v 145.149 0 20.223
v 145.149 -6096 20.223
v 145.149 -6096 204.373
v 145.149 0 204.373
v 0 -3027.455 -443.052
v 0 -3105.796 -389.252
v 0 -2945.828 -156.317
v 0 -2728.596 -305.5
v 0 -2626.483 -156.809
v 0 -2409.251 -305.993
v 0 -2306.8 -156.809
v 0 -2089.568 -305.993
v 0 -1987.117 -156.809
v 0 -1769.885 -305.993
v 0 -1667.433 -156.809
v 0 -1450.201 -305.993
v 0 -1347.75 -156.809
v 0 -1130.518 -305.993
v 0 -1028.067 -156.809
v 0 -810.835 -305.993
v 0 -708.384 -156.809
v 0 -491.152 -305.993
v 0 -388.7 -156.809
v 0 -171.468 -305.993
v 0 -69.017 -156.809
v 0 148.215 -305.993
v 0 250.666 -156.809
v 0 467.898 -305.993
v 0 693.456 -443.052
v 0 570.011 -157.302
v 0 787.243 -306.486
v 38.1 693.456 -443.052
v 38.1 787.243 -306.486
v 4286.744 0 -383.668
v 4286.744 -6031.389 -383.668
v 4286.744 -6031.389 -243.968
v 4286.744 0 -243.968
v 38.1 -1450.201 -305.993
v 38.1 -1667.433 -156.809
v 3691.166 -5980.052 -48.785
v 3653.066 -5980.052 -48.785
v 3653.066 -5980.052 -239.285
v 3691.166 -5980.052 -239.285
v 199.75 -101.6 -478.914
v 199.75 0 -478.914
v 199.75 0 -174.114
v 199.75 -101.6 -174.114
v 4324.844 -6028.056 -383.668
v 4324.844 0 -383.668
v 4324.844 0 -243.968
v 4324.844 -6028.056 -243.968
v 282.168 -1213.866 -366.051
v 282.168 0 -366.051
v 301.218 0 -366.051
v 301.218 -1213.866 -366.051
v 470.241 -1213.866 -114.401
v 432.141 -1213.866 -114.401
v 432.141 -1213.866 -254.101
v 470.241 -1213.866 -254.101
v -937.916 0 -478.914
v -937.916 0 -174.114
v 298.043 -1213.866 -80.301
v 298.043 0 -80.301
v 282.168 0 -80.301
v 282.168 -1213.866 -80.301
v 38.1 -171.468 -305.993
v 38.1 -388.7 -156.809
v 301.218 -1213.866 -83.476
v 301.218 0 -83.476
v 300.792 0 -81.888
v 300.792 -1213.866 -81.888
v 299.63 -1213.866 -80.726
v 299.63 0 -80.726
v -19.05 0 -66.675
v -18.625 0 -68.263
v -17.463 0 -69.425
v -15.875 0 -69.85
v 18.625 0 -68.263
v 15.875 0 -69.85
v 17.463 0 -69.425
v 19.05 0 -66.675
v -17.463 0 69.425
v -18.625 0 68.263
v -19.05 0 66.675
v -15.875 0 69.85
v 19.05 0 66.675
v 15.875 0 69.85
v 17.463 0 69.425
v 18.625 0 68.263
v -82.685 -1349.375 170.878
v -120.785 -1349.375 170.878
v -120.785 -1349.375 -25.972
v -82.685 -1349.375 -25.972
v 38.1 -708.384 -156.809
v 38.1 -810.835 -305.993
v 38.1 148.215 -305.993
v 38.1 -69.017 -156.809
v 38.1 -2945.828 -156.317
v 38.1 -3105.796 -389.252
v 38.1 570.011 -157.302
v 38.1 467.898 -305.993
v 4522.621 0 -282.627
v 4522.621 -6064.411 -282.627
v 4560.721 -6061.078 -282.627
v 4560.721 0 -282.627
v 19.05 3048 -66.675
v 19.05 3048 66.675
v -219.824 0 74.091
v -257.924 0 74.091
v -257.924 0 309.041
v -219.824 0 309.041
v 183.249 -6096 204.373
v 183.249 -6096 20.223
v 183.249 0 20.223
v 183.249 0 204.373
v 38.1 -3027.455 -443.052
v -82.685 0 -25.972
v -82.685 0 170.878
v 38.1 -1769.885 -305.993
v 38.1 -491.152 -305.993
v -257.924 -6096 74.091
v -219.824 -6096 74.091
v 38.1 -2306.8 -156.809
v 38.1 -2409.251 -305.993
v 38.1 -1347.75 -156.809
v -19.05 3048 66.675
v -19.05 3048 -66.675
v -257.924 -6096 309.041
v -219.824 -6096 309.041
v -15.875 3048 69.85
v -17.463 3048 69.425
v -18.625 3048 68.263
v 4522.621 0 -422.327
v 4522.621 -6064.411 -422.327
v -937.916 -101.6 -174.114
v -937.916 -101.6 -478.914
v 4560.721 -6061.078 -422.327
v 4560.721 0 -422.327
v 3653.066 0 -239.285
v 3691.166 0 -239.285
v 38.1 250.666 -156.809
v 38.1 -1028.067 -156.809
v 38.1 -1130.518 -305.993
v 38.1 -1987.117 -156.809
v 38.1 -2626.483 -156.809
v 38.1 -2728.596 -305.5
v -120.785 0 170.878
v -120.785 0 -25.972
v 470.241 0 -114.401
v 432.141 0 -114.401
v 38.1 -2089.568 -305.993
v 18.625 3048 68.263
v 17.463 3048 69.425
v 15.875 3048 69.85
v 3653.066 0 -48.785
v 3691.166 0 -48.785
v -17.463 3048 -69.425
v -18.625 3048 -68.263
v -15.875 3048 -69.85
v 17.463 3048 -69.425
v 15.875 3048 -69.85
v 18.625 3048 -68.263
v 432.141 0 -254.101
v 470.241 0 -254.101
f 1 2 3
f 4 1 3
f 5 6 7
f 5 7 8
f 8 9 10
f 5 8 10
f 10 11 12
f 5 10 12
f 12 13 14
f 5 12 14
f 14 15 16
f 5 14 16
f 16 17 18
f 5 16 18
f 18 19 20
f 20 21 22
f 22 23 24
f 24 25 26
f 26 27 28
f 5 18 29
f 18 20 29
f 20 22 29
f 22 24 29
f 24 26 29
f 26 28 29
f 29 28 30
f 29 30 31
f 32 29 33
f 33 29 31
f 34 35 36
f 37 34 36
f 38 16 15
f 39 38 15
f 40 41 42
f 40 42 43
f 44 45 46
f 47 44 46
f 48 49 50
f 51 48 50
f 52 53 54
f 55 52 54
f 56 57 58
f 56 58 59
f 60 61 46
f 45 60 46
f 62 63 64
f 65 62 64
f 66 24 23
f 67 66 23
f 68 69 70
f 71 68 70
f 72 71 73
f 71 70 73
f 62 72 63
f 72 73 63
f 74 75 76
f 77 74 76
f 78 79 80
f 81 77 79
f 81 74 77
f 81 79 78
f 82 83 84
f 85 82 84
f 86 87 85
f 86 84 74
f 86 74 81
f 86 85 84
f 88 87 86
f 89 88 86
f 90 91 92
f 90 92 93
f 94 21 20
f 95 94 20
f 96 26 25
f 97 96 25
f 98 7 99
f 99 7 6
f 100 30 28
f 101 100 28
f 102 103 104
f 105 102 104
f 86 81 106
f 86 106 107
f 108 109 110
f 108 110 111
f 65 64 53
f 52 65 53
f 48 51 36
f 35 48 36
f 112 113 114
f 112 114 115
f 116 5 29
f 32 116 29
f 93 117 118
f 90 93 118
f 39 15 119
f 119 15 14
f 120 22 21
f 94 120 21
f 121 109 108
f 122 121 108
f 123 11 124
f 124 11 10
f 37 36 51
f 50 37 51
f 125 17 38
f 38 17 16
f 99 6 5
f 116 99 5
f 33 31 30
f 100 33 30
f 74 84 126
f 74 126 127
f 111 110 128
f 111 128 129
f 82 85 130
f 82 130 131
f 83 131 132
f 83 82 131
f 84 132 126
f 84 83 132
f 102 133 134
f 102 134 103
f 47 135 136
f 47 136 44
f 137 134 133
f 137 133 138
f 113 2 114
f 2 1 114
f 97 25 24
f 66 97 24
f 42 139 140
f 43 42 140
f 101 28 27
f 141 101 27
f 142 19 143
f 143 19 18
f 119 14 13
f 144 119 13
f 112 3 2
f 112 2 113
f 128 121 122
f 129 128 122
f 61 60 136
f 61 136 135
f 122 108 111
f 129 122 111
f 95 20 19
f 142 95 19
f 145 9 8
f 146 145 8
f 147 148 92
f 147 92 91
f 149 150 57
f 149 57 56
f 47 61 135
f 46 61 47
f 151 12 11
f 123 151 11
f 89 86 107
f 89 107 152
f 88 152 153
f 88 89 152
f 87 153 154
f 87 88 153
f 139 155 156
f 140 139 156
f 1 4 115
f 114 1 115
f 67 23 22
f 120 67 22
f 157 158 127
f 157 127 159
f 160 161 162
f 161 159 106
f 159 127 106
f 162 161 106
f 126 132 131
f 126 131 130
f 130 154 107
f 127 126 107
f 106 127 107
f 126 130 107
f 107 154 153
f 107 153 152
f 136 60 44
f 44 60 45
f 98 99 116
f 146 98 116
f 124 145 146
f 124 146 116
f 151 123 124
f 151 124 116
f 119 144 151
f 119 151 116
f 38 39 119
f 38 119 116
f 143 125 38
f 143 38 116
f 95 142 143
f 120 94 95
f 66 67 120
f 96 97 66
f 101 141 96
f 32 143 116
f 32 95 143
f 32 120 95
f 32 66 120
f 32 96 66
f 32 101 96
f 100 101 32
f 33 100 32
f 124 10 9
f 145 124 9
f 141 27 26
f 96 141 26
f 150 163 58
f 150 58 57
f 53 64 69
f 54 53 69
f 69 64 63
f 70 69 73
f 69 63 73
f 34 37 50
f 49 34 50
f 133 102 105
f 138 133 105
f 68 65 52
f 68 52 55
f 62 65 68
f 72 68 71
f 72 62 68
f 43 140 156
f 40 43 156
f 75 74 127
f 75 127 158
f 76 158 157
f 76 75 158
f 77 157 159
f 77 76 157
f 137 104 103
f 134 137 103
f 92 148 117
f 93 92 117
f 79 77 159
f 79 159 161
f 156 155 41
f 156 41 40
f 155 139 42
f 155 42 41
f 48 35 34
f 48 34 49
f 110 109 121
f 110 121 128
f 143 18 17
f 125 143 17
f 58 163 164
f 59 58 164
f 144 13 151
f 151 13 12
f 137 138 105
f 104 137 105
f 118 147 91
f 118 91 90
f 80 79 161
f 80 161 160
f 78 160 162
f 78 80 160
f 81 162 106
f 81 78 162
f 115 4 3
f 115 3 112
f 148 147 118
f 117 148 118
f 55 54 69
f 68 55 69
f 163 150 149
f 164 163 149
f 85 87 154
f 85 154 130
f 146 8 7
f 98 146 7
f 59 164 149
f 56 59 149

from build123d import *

# Parameters (mm, degrees)
F1_DEPTH  = 3048
F2_W      = 38.1
F2_H      = 184.15
F3_DEPTH  = 50.8
F4_DEPTH  = 6045.2
F5_W      = 38.1
F5_H      = 234.95
F6_DEPTH  = 6096
F7_W      = 139.7
F7_H      = 19.05
F8_DEPTH  = 1137.666
F9_W      = 139.7
F9_H      = 19.05
F11_DEPTH = 1219.2
F17_W     = 38.1
F17_H     = 196.85
F18_DEPTH = 1349.375
F20_DEPTH = 38.1
F21_W     = 38.1
F21_H     = 139.7
F22_DEPTH = 1213.866
F24_DEPTH = 1213.866
F26_W     = 3048
F26_H     = 4572
F27_DEPTH = 152.4
F29_W     = 38.1
F29_H     = 190.5
F30_DEPTH = 5980.05154
F31_W     = 38.1
F31_H     = 139.7
F32_DEPTH = 6066.1558636
F34_DEPTH = 152.4
F35_W     = 38.1
F35_H     = 139.7
F36_DEPTH = 6111.8779464
F38_DEPTH = 152.4
F39_W     = 1137.666
F39_H     = 304.8
F40_DEPTH = 101.6


with BuildPart() as f1:
    # F0 (on Front) → F1 (new body)
    with BuildSketch(Plane.XZ):
        with BuildLine():
            Line((15.875, 69.85), (-15.875, 69.85))
            ThreePointArc((-15.875, 69.85), (-18.1200640303, 68.9200640303), (-19.05, 66.675))
            Line((-19.05, 66.675), (-19.05, -66.675))
            ThreePointArc((-19.05, -66.675), (-18.1200640303, -68.9200640303), (-15.875, -69.85))
            Line((-15.875, -69.85), (15.875, -69.85))
            ThreePointArc((15.875, -69.85), (18.1200640303, -68.9200640303), (19.05, -66.675))
            Line((19.05, -66.675), (19.05, 66.675))
            ThreePointArc((19.05, 66.675), (18.1200640303, 68.9200640303), (15.875, 69.85))
        make_face()
    extrude(amount=-F1_DEPTH)


with BuildPart() as f3:
    # F2 (on Front) → F3 (new body)
    with BuildSketch(Plane.XZ):
        with Locations((164.1992905617, 112.298101601)):
            Rectangle(F2_W, F2_H)
    extrude(amount=F3_DEPTH)

    # F4 (add): a face of the model
    f4_faces = [f3.faces().sort_by_distance(p)[0] for p in [
        (164.1992905617, -50.8, 112.298101601),
    ]]
    extrude(f4_faces, amount=F4_DEPTH)


with BuildPart() as f6:
    # F5 (on Front) → F6 (new body)
    with BuildSketch(Plane.XZ):
        with Locations((-238.8738712788, 191.5656894207)):
            Rectangle(F5_W, F5_H)
    extrude(amount=F6_DEPTH)


with BuildPart() as f8:
    # F7 (on Front) → F8 (new body)
    with BuildSketch(Plane.XZ):
        with Locations((262.851086998, 128.6662210464)):
            Rectangle(F7_W, F7_H)
    extrude(amount=F8_DEPTH)

    # F9 (on face) → F11 (join)
    with BuildSketch(Plane.XZ.offset(1137.666)):
        with Locations((262.851086998, 128.6662210464)):
            Rectangle(F9_W, F9_H)
    extrude(amount=-F11_DEPTH)


with BuildPart() as f12_1:
    # F12: copy of F8
    add(f8.part)


with BuildPart() as f13_1:
    # F13: copy of F8
    add(f8.part)


with BuildPart() as f18:
    # F17 (on Front) → F18 (new body)
    with BuildSketch(Plane.XZ):
        with Locations((-101.7351278543, 72.4531291306)):
            Rectangle(F17_W, F17_H)
    extrude(amount=F18_DEPTH)


with BuildPart() as f20:
    # F19 (on Right) → F20 (new body)
    with BuildSketch(Plane.YZ):
        Polygon((-3027.4551845205, -443.0521097511), (693.4561667744, -443.0521097511), (787.2428459828, -306.4855299511), (570.0108699828, -157.3021097511), (467.8980279751, -305.9927523136), (250.6660519751, -156.8093321136), (148.2147963751, -305.9927523136), (-69.0171796249, -156.8093321136), (-171.4684352249, -305.9927523136), (-388.7004112249, -156.8093321136), (-491.1516668249, -305.9927523136), (-708.3836428249, -156.8093321136), (-810.8348984249, -305.9927523136), (-1028.0668744249, -156.8093321136), (-1130.5181300249, -305.9927523136), (-1347.7501060249, -156.8093321136), (-1450.2013616249, -305.9927523136), (-1667.4333376249, -156.8093321136), (-1769.8845932249, -305.9927523136), (-1987.1165692249, -156.8093321136), (-2089.5678248249, -305.9927523136), (-2306.7998008249, -156.8093321136), (-2409.2510564249, -305.9927523136), (-2626.4830324249, -156.8093321136), (-2728.5958744326, -305.4999746762), (-2945.8278504326, -156.3165544762), (-3037.4947721797, -289.796444656), (-3105.7956158343, -389.2520491037), align=None)
    extrude(amount=F20_DEPTH)


with BuildPart() as f22:
    # F21 (on Front) → F22 (new body)
    with BuildSketch(Plane.XZ):
        with Locations((451.1910399914, -184.2514254093)):
            Rectangle(F21_W, F21_H)
    extrude(amount=F22_DEPTH)


with BuildPart() as f24:
    # F23 (on Front) → F24 (new body)
    with BuildSketch(Plane.XZ):
        with BuildLine():
            Line((298.0427954674, -80.3009805679), (282.1677954674, -80.3009805679))
            Line((282.1677954674, -80.3009805679), (282.1677954674, -366.0509805679))
            Line((282.1677954674, -366.0509805679), (301.2177954674, -366.0509805679))
            Line((301.2177954674, -366.0509805679), (301.2177954674, -83.4759805679))
            ThreePointArc((301.2177954674, -83.4759805679), (300.2878594976, -81.2309165377), (298.0427954674, -80.3009805679))
        make_face()
    extrude(amount=F24_DEPTH)


with BuildPart() as f27:
    # F26 (on Front) → F27 (new body)
    with BuildSketch(Plane.XZ):
        with Locations((-3768.133808136, 87.837682724)):
            Rectangle(F26_W, F26_H)
    extrude(amount=F27_DEPTH)


with BuildPart() as f30:
    # F29 (on Front) → F30 (new body)
    with BuildSketch(Plane.XZ):
        with Locations((3672.1161624908, -144.0351859331)):
            Rectangle(F29_W, F29_H)
    extrude(amount=F30_DEPTH)


with BuildPart() as f32:
    # F31 (on Front) → F32 (new body)
    with BuildSketch(Plane.XZ):
        with Locations((4305.7936408997, -313.8175882339)):
            Rectangle(F31_W, F31_H)
    extrude(amount=F32_DEPTH)

    # F33 (on face) → F34 (cut)
    with BuildSketch(Plane.XY.offset(-243.9675882339)):
        Polygon((4324.8436408997, -6066.1558636), (4324.8436408997, -6028.0558636), (4286.7436408997, -6031.3891816803), (4286.7436408997, -6066.1558636), align=None)
    extrude(amount=-F34_DEPTH, mode=Mode.SUBTRACT)


with BuildPart() as f36:
    # F35 (on Front) → F36 (new body)
    with BuildSketch(Plane.XZ):
        with Locations((4541.6709205627, -352.4767436028)):
            Rectangle(F35_W, F35_H)
    extrude(amount=F36_DEPTH)

    # F37 (on face) → F38 (cut)
    with BuildSketch(Plane.XY.offset(-282.6267436028)):
        Polygon((4560.7209205627, -6111.8779464), (4560.7209205627, -6061.0779464), (4522.6209205627, -6064.4112644803), (4522.6209205627, -6111.8779464), align=None)
    extrude(amount=-F38_DEPTH, mode=Mode.SUBTRACT)


with BuildPart() as f40:
    # F39 (on Front) → F40 (new body)
    with BuildSketch(Plane.XZ):
        with Locations((-369.0828725739, -326.5144508541)):
            Rectangle(F39_W, F39_H)
    extrude(amount=F40_DEPTH)


solid = Compound([f1.part, f3.part, f6.part, f18.part, f20.part, f22.part, f24.part, f30.part, f32.part, f36.part, f40.part])
